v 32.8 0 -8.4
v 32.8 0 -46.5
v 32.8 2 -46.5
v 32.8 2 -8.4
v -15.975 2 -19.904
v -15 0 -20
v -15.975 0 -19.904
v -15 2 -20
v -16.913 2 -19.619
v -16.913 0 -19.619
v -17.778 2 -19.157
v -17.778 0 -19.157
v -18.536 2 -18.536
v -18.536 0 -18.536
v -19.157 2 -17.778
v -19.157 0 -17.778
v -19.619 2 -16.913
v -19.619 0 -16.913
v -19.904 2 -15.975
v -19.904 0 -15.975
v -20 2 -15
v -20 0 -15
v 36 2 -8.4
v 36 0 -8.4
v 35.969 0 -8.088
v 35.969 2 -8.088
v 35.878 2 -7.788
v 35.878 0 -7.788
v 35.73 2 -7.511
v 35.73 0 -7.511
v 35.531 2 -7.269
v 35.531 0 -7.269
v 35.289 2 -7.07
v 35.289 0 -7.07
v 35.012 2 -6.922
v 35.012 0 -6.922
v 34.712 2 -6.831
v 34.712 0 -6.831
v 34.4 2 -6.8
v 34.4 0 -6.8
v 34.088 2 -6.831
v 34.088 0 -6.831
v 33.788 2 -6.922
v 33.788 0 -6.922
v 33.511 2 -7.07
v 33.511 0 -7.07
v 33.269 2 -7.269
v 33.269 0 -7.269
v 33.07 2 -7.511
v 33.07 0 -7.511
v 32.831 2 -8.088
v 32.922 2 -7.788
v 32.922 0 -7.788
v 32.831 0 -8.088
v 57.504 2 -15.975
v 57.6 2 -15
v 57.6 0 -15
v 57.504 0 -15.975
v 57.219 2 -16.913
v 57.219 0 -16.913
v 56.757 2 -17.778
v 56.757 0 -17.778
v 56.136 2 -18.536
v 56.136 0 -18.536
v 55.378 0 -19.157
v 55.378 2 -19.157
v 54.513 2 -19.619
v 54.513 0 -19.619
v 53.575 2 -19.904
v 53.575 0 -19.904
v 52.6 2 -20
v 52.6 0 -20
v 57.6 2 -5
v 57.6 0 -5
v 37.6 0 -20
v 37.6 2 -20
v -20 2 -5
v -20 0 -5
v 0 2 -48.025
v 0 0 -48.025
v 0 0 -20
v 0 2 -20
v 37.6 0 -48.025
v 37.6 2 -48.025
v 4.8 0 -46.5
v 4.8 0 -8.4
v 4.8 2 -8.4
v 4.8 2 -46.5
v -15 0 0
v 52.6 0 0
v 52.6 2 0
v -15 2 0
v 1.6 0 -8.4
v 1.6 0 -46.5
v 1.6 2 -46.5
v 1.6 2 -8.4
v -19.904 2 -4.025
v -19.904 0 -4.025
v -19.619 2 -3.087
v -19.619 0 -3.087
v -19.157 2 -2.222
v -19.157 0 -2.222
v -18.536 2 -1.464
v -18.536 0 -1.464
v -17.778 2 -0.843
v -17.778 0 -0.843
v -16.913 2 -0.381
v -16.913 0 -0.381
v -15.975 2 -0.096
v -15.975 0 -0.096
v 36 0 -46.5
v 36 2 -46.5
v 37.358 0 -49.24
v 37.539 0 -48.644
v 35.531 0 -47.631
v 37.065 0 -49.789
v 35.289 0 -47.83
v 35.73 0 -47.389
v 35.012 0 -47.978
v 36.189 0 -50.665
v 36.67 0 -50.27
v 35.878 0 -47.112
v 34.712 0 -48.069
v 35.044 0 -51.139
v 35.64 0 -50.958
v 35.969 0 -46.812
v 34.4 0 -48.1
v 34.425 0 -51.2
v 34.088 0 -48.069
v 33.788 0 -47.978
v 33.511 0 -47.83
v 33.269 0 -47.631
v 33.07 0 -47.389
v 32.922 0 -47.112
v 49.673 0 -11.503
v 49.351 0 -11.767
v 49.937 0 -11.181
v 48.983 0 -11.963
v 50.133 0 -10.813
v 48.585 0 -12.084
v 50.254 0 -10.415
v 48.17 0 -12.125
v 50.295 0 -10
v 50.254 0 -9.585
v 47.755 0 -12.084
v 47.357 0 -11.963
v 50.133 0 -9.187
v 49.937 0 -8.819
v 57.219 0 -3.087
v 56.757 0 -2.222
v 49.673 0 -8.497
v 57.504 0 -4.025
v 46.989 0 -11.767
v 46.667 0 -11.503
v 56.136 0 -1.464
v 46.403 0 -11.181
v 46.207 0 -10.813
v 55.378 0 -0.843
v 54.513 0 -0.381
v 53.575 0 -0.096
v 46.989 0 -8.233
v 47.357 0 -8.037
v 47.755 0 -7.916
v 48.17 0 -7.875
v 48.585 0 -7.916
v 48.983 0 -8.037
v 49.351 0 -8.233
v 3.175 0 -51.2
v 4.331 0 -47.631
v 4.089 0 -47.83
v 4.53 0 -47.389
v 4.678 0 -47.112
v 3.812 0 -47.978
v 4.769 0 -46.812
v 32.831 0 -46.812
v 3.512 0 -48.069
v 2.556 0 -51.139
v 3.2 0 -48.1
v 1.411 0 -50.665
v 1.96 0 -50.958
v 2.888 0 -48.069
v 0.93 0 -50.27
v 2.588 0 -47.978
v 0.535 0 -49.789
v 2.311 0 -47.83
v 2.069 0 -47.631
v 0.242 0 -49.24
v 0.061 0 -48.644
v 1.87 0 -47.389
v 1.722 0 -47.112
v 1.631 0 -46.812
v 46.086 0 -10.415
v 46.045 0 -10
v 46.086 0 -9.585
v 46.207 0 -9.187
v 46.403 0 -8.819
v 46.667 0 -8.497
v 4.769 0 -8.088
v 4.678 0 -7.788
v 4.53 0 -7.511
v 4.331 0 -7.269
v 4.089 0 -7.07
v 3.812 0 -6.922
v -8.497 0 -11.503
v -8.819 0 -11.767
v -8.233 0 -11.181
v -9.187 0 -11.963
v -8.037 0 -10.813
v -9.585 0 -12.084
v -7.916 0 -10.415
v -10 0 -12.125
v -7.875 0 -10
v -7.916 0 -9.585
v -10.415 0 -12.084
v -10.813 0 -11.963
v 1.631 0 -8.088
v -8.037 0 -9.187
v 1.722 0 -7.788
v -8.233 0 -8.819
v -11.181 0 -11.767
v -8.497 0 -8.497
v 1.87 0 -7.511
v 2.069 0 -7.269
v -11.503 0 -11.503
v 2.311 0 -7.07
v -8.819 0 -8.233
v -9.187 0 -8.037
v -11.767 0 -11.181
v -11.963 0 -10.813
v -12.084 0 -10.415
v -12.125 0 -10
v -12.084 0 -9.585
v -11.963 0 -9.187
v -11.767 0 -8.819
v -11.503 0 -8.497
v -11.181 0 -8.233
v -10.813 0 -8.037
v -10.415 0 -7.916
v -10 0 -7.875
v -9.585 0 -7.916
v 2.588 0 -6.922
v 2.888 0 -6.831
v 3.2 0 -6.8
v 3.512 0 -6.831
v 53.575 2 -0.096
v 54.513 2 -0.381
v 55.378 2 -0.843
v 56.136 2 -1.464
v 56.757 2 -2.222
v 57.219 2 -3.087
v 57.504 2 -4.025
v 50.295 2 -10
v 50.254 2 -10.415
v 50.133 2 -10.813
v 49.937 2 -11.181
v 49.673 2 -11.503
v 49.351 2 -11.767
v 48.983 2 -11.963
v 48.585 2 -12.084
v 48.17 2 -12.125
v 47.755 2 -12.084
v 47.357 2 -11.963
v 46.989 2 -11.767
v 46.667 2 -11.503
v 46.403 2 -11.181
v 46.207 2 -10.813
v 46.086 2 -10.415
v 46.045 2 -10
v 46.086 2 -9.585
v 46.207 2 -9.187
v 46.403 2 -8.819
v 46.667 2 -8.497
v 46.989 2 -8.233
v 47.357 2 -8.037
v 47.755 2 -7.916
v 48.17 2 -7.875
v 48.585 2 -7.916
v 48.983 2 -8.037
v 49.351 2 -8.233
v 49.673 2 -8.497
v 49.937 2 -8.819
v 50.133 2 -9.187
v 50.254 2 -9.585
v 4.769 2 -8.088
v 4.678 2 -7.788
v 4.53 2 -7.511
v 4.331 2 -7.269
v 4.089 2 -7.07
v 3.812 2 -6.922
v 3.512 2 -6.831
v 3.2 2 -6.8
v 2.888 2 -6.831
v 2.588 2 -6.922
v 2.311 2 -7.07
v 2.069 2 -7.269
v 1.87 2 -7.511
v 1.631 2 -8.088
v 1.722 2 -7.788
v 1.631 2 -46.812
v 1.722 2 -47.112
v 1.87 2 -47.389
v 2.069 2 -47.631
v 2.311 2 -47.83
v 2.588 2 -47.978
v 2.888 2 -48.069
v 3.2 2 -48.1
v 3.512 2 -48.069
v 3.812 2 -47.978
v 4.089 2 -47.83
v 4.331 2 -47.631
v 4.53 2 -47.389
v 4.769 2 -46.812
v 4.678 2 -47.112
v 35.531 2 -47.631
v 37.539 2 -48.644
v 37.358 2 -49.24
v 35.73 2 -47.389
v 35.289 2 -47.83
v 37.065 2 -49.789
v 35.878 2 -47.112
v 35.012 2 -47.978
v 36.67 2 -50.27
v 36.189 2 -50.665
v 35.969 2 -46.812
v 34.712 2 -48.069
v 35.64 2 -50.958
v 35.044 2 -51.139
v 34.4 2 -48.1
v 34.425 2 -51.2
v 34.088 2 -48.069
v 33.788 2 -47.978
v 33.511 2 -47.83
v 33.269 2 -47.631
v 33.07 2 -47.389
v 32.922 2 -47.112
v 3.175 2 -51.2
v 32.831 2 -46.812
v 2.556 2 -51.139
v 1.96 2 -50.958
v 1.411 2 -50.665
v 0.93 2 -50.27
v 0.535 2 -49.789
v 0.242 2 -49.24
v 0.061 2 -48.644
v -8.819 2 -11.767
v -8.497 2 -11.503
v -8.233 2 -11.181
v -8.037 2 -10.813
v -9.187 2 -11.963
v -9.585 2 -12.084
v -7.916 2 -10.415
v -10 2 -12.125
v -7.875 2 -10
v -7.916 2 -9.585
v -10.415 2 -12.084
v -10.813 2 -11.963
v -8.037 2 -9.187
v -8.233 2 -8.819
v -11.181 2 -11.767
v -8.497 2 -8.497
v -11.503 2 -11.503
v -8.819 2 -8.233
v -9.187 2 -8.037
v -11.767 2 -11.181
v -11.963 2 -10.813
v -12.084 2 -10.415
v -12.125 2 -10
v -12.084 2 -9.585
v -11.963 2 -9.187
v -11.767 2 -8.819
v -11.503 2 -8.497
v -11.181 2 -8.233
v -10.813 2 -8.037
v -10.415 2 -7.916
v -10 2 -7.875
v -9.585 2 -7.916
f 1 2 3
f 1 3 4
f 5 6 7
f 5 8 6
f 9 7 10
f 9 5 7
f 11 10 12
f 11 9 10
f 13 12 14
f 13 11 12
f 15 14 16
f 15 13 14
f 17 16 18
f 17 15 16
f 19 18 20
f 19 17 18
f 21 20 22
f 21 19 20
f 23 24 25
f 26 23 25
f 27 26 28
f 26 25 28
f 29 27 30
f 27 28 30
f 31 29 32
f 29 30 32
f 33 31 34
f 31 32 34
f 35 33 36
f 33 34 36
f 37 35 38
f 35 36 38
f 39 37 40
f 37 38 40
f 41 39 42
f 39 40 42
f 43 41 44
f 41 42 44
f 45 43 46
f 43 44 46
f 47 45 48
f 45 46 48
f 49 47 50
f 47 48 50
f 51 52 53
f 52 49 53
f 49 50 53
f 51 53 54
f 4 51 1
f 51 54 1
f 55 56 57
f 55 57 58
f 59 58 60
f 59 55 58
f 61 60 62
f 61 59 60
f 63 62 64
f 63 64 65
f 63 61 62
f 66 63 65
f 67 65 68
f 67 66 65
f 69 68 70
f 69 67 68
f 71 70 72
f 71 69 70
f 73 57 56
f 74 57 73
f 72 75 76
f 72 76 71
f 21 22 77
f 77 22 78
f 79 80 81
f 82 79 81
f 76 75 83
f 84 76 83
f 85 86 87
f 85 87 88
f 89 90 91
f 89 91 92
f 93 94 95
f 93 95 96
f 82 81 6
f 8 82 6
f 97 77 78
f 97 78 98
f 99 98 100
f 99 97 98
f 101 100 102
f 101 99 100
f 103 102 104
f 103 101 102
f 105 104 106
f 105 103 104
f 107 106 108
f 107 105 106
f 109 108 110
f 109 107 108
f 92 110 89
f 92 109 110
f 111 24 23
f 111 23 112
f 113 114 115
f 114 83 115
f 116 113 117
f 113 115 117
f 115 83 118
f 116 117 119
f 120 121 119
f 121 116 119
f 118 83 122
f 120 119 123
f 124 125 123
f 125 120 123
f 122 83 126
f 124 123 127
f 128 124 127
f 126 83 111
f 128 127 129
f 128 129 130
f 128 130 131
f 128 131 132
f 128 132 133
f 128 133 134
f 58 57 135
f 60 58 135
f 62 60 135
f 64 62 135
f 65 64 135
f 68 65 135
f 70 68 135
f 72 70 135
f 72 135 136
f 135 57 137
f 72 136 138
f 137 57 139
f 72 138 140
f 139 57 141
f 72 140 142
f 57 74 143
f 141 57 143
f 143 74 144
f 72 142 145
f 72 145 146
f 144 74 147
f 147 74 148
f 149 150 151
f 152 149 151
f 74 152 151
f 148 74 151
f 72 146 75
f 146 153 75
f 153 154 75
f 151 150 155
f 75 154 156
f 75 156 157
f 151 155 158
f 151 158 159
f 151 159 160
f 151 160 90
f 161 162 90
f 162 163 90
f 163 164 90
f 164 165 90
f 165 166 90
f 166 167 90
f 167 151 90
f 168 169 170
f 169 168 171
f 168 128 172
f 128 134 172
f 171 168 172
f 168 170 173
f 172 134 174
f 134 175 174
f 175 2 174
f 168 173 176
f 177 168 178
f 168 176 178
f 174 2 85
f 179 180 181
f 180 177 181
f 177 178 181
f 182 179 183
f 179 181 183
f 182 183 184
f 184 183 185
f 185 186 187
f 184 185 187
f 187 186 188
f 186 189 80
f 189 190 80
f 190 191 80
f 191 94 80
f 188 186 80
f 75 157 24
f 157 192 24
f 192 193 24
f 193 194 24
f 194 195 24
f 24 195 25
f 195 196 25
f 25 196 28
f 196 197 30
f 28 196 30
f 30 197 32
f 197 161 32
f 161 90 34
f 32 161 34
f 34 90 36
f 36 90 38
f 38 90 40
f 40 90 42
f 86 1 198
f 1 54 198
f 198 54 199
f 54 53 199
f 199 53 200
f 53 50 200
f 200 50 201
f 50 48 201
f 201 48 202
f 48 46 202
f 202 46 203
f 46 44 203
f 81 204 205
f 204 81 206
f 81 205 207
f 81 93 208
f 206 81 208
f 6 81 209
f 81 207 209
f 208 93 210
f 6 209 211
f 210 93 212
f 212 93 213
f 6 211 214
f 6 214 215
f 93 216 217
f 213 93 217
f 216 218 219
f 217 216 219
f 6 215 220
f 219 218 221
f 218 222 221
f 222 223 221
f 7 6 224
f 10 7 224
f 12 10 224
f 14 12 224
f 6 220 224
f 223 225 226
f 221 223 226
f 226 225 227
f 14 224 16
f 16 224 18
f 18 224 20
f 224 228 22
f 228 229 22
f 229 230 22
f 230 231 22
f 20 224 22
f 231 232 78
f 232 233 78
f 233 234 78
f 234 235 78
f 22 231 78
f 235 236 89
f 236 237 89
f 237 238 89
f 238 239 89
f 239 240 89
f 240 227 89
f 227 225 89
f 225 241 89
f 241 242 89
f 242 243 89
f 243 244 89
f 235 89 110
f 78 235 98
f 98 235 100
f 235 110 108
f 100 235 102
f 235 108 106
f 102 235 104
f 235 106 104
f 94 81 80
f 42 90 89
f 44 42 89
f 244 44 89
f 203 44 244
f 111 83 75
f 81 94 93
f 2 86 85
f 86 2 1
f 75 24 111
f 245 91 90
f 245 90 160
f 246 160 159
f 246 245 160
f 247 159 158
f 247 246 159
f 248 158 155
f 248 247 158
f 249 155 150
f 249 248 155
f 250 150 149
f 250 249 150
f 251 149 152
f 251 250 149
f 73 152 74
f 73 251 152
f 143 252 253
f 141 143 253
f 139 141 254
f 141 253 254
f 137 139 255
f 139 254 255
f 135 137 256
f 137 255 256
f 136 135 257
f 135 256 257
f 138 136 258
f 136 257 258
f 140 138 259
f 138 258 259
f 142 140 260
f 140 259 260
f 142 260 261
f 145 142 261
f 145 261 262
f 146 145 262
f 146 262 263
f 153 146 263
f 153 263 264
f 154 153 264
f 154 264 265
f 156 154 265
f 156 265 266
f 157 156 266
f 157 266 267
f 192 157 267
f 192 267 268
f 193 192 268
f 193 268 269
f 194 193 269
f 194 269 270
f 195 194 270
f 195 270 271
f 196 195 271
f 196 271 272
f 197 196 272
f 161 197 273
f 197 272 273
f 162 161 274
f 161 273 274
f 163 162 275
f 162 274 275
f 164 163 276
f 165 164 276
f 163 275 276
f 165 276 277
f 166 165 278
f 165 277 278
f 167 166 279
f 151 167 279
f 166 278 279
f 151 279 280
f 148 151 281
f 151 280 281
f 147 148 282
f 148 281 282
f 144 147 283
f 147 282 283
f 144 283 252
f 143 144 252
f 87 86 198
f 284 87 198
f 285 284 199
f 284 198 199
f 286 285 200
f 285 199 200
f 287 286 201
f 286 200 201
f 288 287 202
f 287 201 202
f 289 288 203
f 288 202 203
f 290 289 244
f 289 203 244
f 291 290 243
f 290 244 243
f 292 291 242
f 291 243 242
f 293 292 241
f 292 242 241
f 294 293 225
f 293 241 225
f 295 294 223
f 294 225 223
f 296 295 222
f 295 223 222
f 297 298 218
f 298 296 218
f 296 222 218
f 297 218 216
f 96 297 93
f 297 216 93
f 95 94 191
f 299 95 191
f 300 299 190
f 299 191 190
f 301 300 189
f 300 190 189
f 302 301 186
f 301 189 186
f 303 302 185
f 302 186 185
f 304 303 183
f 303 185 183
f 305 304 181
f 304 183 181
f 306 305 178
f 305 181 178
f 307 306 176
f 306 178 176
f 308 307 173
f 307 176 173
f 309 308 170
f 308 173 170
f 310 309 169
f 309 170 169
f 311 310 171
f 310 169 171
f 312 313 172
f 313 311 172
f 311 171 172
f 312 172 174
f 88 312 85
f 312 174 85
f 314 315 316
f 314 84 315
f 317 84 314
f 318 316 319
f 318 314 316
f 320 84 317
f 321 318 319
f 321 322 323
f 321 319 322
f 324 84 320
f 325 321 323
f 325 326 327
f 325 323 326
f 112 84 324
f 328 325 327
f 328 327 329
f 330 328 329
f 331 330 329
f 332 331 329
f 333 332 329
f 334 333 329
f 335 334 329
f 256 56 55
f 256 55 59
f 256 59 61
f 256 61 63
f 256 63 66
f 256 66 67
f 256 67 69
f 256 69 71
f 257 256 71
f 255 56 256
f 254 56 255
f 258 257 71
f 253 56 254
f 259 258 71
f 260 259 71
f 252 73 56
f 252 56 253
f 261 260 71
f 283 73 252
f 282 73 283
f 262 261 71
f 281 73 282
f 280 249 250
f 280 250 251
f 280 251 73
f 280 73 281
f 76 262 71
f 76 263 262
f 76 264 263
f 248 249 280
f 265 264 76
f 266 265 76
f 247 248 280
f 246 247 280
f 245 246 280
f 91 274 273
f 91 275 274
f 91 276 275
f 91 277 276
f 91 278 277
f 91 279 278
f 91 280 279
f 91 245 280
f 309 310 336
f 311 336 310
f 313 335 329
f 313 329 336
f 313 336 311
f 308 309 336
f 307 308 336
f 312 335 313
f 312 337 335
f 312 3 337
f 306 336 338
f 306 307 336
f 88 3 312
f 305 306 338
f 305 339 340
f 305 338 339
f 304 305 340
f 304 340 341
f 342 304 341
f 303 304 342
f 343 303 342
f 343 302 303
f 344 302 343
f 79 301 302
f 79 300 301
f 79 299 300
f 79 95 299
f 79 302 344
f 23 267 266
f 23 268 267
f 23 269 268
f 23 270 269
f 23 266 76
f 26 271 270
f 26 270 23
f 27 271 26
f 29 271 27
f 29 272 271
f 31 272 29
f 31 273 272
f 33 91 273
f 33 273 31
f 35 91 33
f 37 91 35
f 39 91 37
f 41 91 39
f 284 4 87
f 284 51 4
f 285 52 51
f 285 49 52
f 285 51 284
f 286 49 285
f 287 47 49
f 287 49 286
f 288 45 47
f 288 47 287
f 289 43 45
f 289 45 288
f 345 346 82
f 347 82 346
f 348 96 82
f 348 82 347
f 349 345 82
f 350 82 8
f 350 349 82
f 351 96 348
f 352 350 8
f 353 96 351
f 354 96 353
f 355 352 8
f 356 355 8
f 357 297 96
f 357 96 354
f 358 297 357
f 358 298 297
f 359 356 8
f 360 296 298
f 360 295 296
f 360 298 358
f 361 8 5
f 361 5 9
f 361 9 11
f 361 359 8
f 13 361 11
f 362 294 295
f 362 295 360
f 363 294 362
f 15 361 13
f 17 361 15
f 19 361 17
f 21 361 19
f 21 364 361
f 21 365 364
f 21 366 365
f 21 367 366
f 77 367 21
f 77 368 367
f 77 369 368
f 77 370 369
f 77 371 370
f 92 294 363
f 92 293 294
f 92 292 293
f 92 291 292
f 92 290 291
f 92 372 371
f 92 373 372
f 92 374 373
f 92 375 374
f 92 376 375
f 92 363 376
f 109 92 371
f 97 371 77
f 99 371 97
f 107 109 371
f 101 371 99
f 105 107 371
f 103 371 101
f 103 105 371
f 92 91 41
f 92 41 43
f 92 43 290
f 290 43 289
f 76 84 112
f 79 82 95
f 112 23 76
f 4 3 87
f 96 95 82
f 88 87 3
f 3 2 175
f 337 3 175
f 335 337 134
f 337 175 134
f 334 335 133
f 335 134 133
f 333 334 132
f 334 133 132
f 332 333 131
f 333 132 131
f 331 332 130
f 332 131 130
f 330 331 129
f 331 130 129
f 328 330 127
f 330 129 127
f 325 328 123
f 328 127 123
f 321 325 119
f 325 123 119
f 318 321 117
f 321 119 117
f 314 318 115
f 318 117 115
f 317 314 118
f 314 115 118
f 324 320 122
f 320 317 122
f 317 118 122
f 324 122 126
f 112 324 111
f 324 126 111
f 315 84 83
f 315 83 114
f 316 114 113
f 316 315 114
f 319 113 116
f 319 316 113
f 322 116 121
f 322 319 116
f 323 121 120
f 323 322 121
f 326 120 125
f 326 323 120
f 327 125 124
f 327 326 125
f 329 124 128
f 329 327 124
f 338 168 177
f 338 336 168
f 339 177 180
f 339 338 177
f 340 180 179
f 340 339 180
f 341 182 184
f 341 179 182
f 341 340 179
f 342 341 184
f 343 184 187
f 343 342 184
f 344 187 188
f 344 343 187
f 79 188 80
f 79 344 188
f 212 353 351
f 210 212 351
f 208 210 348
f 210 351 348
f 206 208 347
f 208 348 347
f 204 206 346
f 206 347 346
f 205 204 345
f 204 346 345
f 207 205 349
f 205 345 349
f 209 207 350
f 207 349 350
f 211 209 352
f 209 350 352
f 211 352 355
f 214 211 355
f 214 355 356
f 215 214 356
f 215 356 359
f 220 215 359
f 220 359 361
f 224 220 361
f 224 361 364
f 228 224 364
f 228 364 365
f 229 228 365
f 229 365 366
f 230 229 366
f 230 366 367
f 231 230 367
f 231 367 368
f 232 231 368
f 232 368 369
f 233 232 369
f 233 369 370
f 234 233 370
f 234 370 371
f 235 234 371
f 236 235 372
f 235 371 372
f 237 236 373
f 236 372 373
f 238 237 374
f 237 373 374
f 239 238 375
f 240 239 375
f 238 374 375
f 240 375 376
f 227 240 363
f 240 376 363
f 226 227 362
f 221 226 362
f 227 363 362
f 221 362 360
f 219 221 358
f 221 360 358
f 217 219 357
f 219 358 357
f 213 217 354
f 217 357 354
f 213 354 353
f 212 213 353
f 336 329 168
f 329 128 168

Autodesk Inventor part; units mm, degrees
ref_plane "YZ Plane" through (0, 0, 0) normal (1, 0, 0) x (0, 1, 0)
ref_plane "XZ Plane" through (0, 0, 0) normal (0, 1, 0) x (-1, 0, 0)
ref_plane "XY Plane" through (0, 0, 0) normal (0, 0, 1) x (1, 0, 0)
sketch "Sketch1" plane through (0, 0, 0) normal (0, 1, 0) x (-1, 0, 0)
  line L0 (0, 0) -> (-37.6, 0)
  line L1 (-37.6, -20) -> (-37.6, -51.2)
  line L2 (-37.6, -51.2) -> (0, -51.2)
  line L3 (0, -51.2) -> (0, -20)
  line L4 (-18.8, 0) -> (-1.65, 0)
  line L5 (-1.65, 0) -> (-23.35, 0)
  line L6 (-18.8, 0) -> (5.35, 0)
  line L7 (5.35, 0) -> (-25.85, 0)
  line L8 (-18.8, 0) -> (-3.2, 0)
  line L9 (-3.2, 0) -> (-34.4, 0)
  arc A0 (-32.8, -8.4) -> (-36, -8.4) centre (-34.4, -8.4) ccw
  arc A1 (-36, -46.5) -> (-32.8, -46.5) centre (-34.4, -46.5) ccw
  arc A2 (-1.6, -8.4) -> (-4.8, -8.4) centre (-3.2, -8.4) ccw
  arc A3 (-4.8, -46.5) -> (-1.6, -46.5) centre (-3.2, -46.5) ccw
  line L10 (0, 0) -> (0, -20)
  line L11 (0, -20) -> (20, -20)
  line L12 (20, -20) -> (20, 0)
  line L13 (20, 0) -> (0, 0)
  line L14 (-37.6, -20) -> (-57.6, -20)
  line L15 (-57.6, -20) -> (-57.6, 0)
  line L16 (-57.6, 0) -> (-37.6, 0)
  line L17 (-1.6, -46.5) -> (-1.6, -8.4)
  line L18 (-4.8, -8.4) -> (-4.8, -46.5)
  line L19 (-32.8, -46.5) -> (-32.8, -8.4)
  line L20 (-36, -8.4) -> (-36, -46.5)
  point P0 (5.35, 0)
  dimension "d0" = 37.6
  dimension "d1" = 51.2
  dimension "d41" = 15.6
  dimension "d42" = 31.2
  dimension "d50" = 3.2
  dimension "d56" = 3.2
  dimension "d57" = 3.2
  dimension "d63" = 3.2
  dimension "d67" = 8.4
  dimension "d77" = 8.4
  dimension "d81" = 20
  dimension "d82" = 20
  dimension "d83" = 20
extrude "Extrusion3" add sketch "Sketch1" along normal blind 2
fillet "Fillet2" radius 3.175 2 edges at (0, 1, -51.2) (37.6, 1, -51.2)
sketch "Sketch2" plane through (0, 2, 0) normal (0, 1, 0) x (1, 0, 0)
  circle A0 centre (-10, 10) radius 2.125
  line L0 (-20, 0) -> (57.6, 0) projected
  line L1 (38.17, 0) -> (48.17, 0)
  circle A1 centre (48.17, 10) radius 2.125
  point P0 (0, 0)
  dimension "d85" = 4.25
  dimension "d86" = 10
  dimension "d88" = 4.25
extrude "Extrusion4" cut sketch "Sketch2" against normal blind 2
fillet "Fillet3" radius 5 4 edges at (57.6, 1, -20) (57.6, 1, 0) (-20, 1, 0) (-20, 1, -20)
properties part number "Motor Attachment"
